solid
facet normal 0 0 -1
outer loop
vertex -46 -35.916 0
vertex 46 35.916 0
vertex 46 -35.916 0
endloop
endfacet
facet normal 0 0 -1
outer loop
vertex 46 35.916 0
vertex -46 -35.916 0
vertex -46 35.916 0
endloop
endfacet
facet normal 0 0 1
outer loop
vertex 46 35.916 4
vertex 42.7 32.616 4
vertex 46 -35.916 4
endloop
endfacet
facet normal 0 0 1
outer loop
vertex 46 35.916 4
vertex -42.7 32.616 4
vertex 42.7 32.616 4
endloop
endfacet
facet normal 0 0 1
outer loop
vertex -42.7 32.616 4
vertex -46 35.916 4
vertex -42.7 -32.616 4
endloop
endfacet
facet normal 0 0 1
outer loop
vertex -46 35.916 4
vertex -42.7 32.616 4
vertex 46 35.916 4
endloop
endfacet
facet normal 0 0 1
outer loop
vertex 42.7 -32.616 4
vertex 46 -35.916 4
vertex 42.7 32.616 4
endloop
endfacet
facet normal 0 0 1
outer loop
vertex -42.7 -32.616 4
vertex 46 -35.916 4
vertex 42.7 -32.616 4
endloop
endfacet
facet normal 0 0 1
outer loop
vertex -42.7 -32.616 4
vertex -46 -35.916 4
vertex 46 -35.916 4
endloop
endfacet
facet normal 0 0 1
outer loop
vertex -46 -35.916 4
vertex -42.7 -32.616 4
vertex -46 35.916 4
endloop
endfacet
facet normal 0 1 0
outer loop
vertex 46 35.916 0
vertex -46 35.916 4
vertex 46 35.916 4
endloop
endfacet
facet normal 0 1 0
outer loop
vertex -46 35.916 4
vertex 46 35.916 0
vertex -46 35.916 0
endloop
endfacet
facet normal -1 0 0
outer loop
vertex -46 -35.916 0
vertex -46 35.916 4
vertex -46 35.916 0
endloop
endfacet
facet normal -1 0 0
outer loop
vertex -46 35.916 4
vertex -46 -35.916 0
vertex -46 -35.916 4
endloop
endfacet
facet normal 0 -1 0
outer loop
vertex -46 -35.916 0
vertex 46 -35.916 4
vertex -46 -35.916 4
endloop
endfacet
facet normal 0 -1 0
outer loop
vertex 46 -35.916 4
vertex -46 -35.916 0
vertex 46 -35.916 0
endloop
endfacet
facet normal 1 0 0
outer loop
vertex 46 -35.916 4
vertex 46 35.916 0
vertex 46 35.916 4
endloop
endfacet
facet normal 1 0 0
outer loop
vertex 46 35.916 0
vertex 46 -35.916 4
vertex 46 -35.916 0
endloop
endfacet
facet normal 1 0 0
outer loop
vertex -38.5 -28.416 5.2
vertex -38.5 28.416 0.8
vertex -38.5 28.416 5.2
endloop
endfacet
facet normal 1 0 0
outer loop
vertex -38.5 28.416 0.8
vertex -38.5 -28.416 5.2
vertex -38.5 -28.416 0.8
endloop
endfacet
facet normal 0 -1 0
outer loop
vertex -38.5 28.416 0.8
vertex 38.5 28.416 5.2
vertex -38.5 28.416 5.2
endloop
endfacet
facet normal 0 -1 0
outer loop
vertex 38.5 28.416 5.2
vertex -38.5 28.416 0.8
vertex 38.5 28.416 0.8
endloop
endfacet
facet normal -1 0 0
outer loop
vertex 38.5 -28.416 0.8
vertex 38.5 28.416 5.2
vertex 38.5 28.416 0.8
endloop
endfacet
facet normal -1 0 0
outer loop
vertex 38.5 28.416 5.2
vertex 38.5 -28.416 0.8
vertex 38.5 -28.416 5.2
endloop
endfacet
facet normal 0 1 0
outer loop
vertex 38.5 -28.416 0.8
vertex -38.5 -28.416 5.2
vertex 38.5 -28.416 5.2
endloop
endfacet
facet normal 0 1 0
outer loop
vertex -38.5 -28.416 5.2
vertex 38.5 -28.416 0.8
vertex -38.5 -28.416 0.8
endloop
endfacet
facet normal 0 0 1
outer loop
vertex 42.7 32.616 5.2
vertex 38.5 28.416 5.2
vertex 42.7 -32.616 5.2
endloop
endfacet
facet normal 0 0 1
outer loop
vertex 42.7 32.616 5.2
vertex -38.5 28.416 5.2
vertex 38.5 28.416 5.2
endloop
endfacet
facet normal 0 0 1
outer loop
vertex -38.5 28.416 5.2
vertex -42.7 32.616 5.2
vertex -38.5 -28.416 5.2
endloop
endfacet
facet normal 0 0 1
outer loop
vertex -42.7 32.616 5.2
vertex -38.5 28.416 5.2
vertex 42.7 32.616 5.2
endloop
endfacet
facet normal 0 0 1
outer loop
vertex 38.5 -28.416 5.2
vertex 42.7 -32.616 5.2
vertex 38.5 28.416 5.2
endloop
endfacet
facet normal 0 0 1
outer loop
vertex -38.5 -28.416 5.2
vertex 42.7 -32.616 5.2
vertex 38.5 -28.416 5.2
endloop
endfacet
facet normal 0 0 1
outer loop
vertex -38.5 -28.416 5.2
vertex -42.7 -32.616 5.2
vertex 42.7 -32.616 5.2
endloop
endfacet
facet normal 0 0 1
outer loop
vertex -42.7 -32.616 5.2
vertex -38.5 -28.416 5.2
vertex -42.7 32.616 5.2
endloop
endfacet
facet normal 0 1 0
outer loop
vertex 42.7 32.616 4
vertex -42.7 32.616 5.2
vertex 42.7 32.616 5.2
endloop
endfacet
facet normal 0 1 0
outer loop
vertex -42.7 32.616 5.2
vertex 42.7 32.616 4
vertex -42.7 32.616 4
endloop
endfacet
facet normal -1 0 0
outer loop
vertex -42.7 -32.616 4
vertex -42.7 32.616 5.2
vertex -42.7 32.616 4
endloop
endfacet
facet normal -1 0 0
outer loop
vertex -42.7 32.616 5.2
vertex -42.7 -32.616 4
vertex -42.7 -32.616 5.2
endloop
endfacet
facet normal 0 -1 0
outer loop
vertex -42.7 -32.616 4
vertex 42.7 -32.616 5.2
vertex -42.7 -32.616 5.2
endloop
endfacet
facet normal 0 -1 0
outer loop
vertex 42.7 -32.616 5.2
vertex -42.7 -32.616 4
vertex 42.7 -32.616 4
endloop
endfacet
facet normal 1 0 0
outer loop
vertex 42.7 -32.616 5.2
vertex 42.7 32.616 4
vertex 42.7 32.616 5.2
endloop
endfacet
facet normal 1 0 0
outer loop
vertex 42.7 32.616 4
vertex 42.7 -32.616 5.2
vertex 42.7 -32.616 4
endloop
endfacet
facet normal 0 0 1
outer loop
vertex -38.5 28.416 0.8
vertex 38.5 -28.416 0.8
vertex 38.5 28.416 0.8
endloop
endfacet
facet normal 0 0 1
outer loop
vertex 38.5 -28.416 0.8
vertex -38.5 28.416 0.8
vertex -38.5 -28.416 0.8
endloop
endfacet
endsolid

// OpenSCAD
// ============================================================
// PHOTO LITHOPHANE — turn a photo into a backlit 3D print
// ============================================================
// A lithophane is a photo made of THICKNESS instead of ink:
// where the picture is dark, the plastic is thick (blocks
// light); where it's bright, the plastic is thin (glows).
// It looks like a ghostly blob... until you hold it up to a
// lamp or window. Then the photo appears. Magic since the 1800s!
//
// HOW TO MAKE YOURS (4 steps):
//   1. Pick a photo with good contrast (faces + pets work great).
//   2. Shrink it to about 200 pixels wide and save it as a
//      GRAYSCALE .png in this folder. (Any photo app can do
//      this — and use "auto contrast" so it has true blacks
//      AND true whites; washed-out gray photos come out flat.)
//   3. Set image_file + the pixel size below. Render (F6 —
//      it's slow, that's normal: one bump per pixel!).
//   4. No photo yet? Run `python3 make-test-image.py` once and
//      the default test-photo.png renders out of the box.
//
// Print — IMPORTANT, on the H2C print it standing VERTICAL:
// in Bambu Studio rotate it 90° so the picture faces sideways.
// Standing up, the fine nozzle X-Y movement draws the picture
// detail (~0.05 mm precise) instead of chunky 0.2 mm layer
// steps, and light shines through walls, not through top/bottom
// fill patterns. Use WHITE PLA, 100% infill (it's thin anyway),
// slow speed. A small brim helps it stand. ~1-2 hrs.
// ============================================================

// ------------ CHANGE THESE ------------
image_file  = "test-photo.png"; // your grayscale photo (same folder)
image_px_w  = 120;      // your photo's width in pixels
image_px_h  = 90;       // your photo's height in pixels
panel_w     = 80;       // how wide the picture area prints (mm)
min_th      = 0.8;      // thinnest spot (brightest) — glows most
max_th      = 3.0;      // thickest spot (darkest) — blocks light
frame_style = "classic"; // "classic" (stepped), "flat", or "none"
frame_w     = 6;        // frame border width (mm)
// ---------------------------------------

// mm per pixel (the picture keeps its shape — no squishing)
px      = panel_w / (image_px_w - 1);
panel_h = px * (image_px_h - 1);          // picture height comes out of that

// surface() reads brightness as height 0-100, so this squashes
// "100" down to exactly the thickness range you asked for
z_squash = (max_th - min_th) / 100;

frame_th  = max_th + 1;   // frame is a bit prouder than the darkest spot
lip       = 1.5;          // frame overlaps the picture edge by this much

$fn = 48;

// ============ the picture itself ============
// Layer 1: a solid sheet as thick as the BRIGHTEST spot ever gets.
translate([-panel_w/2, -panel_h/2, 0])
    cube([panel_w, panel_h, min_th]);

// Layer 2: the photo as a 3D bumpy landscape on top.
// invert = true flips brightness so DARK pixels become TALL
// bumps — exactly what a lithophane needs.
translate([0, 0, max_th])          // hang the bumps from the max height
    scale([px, px, z_squash])
        surface(file = image_file, invert = true, center = true);

// ============ the picture frame ============
// The frame's inner lip overlaps the picture edge, welding
// everything into one solid piece (and hiding the raw edge).
module frame_ring(grow, h) {       // one rectangular ring
    linear_extrude(h)
        difference() {
            square([panel_w + 2*grow, panel_h + 2*grow], center = true);
            square([panel_w - 2*lip,  panel_h - 2*lip],  center = true);
        }
}

if (frame_style == "flat")
    frame_ring(frame_w, frame_th);
if (frame_style == "classic") {    // two steps, like a real picture frame
    frame_ring(frame_w, frame_th);
    frame_ring(frame_w * 0.45, frame_th + 1.2);
}

// IDEAS TO TRY (or ask Claude):
//  - a hanging hole in the frame, or feet so it stands on a shelf
//  - a lithophane NIGHT LIGHT: curve it around a cheap LED puck
//  - Peter: a city skyline photo — buildings glow, sky stays dark
//  - a 4-photo "window pane" — for-loop of panels in one big frame
